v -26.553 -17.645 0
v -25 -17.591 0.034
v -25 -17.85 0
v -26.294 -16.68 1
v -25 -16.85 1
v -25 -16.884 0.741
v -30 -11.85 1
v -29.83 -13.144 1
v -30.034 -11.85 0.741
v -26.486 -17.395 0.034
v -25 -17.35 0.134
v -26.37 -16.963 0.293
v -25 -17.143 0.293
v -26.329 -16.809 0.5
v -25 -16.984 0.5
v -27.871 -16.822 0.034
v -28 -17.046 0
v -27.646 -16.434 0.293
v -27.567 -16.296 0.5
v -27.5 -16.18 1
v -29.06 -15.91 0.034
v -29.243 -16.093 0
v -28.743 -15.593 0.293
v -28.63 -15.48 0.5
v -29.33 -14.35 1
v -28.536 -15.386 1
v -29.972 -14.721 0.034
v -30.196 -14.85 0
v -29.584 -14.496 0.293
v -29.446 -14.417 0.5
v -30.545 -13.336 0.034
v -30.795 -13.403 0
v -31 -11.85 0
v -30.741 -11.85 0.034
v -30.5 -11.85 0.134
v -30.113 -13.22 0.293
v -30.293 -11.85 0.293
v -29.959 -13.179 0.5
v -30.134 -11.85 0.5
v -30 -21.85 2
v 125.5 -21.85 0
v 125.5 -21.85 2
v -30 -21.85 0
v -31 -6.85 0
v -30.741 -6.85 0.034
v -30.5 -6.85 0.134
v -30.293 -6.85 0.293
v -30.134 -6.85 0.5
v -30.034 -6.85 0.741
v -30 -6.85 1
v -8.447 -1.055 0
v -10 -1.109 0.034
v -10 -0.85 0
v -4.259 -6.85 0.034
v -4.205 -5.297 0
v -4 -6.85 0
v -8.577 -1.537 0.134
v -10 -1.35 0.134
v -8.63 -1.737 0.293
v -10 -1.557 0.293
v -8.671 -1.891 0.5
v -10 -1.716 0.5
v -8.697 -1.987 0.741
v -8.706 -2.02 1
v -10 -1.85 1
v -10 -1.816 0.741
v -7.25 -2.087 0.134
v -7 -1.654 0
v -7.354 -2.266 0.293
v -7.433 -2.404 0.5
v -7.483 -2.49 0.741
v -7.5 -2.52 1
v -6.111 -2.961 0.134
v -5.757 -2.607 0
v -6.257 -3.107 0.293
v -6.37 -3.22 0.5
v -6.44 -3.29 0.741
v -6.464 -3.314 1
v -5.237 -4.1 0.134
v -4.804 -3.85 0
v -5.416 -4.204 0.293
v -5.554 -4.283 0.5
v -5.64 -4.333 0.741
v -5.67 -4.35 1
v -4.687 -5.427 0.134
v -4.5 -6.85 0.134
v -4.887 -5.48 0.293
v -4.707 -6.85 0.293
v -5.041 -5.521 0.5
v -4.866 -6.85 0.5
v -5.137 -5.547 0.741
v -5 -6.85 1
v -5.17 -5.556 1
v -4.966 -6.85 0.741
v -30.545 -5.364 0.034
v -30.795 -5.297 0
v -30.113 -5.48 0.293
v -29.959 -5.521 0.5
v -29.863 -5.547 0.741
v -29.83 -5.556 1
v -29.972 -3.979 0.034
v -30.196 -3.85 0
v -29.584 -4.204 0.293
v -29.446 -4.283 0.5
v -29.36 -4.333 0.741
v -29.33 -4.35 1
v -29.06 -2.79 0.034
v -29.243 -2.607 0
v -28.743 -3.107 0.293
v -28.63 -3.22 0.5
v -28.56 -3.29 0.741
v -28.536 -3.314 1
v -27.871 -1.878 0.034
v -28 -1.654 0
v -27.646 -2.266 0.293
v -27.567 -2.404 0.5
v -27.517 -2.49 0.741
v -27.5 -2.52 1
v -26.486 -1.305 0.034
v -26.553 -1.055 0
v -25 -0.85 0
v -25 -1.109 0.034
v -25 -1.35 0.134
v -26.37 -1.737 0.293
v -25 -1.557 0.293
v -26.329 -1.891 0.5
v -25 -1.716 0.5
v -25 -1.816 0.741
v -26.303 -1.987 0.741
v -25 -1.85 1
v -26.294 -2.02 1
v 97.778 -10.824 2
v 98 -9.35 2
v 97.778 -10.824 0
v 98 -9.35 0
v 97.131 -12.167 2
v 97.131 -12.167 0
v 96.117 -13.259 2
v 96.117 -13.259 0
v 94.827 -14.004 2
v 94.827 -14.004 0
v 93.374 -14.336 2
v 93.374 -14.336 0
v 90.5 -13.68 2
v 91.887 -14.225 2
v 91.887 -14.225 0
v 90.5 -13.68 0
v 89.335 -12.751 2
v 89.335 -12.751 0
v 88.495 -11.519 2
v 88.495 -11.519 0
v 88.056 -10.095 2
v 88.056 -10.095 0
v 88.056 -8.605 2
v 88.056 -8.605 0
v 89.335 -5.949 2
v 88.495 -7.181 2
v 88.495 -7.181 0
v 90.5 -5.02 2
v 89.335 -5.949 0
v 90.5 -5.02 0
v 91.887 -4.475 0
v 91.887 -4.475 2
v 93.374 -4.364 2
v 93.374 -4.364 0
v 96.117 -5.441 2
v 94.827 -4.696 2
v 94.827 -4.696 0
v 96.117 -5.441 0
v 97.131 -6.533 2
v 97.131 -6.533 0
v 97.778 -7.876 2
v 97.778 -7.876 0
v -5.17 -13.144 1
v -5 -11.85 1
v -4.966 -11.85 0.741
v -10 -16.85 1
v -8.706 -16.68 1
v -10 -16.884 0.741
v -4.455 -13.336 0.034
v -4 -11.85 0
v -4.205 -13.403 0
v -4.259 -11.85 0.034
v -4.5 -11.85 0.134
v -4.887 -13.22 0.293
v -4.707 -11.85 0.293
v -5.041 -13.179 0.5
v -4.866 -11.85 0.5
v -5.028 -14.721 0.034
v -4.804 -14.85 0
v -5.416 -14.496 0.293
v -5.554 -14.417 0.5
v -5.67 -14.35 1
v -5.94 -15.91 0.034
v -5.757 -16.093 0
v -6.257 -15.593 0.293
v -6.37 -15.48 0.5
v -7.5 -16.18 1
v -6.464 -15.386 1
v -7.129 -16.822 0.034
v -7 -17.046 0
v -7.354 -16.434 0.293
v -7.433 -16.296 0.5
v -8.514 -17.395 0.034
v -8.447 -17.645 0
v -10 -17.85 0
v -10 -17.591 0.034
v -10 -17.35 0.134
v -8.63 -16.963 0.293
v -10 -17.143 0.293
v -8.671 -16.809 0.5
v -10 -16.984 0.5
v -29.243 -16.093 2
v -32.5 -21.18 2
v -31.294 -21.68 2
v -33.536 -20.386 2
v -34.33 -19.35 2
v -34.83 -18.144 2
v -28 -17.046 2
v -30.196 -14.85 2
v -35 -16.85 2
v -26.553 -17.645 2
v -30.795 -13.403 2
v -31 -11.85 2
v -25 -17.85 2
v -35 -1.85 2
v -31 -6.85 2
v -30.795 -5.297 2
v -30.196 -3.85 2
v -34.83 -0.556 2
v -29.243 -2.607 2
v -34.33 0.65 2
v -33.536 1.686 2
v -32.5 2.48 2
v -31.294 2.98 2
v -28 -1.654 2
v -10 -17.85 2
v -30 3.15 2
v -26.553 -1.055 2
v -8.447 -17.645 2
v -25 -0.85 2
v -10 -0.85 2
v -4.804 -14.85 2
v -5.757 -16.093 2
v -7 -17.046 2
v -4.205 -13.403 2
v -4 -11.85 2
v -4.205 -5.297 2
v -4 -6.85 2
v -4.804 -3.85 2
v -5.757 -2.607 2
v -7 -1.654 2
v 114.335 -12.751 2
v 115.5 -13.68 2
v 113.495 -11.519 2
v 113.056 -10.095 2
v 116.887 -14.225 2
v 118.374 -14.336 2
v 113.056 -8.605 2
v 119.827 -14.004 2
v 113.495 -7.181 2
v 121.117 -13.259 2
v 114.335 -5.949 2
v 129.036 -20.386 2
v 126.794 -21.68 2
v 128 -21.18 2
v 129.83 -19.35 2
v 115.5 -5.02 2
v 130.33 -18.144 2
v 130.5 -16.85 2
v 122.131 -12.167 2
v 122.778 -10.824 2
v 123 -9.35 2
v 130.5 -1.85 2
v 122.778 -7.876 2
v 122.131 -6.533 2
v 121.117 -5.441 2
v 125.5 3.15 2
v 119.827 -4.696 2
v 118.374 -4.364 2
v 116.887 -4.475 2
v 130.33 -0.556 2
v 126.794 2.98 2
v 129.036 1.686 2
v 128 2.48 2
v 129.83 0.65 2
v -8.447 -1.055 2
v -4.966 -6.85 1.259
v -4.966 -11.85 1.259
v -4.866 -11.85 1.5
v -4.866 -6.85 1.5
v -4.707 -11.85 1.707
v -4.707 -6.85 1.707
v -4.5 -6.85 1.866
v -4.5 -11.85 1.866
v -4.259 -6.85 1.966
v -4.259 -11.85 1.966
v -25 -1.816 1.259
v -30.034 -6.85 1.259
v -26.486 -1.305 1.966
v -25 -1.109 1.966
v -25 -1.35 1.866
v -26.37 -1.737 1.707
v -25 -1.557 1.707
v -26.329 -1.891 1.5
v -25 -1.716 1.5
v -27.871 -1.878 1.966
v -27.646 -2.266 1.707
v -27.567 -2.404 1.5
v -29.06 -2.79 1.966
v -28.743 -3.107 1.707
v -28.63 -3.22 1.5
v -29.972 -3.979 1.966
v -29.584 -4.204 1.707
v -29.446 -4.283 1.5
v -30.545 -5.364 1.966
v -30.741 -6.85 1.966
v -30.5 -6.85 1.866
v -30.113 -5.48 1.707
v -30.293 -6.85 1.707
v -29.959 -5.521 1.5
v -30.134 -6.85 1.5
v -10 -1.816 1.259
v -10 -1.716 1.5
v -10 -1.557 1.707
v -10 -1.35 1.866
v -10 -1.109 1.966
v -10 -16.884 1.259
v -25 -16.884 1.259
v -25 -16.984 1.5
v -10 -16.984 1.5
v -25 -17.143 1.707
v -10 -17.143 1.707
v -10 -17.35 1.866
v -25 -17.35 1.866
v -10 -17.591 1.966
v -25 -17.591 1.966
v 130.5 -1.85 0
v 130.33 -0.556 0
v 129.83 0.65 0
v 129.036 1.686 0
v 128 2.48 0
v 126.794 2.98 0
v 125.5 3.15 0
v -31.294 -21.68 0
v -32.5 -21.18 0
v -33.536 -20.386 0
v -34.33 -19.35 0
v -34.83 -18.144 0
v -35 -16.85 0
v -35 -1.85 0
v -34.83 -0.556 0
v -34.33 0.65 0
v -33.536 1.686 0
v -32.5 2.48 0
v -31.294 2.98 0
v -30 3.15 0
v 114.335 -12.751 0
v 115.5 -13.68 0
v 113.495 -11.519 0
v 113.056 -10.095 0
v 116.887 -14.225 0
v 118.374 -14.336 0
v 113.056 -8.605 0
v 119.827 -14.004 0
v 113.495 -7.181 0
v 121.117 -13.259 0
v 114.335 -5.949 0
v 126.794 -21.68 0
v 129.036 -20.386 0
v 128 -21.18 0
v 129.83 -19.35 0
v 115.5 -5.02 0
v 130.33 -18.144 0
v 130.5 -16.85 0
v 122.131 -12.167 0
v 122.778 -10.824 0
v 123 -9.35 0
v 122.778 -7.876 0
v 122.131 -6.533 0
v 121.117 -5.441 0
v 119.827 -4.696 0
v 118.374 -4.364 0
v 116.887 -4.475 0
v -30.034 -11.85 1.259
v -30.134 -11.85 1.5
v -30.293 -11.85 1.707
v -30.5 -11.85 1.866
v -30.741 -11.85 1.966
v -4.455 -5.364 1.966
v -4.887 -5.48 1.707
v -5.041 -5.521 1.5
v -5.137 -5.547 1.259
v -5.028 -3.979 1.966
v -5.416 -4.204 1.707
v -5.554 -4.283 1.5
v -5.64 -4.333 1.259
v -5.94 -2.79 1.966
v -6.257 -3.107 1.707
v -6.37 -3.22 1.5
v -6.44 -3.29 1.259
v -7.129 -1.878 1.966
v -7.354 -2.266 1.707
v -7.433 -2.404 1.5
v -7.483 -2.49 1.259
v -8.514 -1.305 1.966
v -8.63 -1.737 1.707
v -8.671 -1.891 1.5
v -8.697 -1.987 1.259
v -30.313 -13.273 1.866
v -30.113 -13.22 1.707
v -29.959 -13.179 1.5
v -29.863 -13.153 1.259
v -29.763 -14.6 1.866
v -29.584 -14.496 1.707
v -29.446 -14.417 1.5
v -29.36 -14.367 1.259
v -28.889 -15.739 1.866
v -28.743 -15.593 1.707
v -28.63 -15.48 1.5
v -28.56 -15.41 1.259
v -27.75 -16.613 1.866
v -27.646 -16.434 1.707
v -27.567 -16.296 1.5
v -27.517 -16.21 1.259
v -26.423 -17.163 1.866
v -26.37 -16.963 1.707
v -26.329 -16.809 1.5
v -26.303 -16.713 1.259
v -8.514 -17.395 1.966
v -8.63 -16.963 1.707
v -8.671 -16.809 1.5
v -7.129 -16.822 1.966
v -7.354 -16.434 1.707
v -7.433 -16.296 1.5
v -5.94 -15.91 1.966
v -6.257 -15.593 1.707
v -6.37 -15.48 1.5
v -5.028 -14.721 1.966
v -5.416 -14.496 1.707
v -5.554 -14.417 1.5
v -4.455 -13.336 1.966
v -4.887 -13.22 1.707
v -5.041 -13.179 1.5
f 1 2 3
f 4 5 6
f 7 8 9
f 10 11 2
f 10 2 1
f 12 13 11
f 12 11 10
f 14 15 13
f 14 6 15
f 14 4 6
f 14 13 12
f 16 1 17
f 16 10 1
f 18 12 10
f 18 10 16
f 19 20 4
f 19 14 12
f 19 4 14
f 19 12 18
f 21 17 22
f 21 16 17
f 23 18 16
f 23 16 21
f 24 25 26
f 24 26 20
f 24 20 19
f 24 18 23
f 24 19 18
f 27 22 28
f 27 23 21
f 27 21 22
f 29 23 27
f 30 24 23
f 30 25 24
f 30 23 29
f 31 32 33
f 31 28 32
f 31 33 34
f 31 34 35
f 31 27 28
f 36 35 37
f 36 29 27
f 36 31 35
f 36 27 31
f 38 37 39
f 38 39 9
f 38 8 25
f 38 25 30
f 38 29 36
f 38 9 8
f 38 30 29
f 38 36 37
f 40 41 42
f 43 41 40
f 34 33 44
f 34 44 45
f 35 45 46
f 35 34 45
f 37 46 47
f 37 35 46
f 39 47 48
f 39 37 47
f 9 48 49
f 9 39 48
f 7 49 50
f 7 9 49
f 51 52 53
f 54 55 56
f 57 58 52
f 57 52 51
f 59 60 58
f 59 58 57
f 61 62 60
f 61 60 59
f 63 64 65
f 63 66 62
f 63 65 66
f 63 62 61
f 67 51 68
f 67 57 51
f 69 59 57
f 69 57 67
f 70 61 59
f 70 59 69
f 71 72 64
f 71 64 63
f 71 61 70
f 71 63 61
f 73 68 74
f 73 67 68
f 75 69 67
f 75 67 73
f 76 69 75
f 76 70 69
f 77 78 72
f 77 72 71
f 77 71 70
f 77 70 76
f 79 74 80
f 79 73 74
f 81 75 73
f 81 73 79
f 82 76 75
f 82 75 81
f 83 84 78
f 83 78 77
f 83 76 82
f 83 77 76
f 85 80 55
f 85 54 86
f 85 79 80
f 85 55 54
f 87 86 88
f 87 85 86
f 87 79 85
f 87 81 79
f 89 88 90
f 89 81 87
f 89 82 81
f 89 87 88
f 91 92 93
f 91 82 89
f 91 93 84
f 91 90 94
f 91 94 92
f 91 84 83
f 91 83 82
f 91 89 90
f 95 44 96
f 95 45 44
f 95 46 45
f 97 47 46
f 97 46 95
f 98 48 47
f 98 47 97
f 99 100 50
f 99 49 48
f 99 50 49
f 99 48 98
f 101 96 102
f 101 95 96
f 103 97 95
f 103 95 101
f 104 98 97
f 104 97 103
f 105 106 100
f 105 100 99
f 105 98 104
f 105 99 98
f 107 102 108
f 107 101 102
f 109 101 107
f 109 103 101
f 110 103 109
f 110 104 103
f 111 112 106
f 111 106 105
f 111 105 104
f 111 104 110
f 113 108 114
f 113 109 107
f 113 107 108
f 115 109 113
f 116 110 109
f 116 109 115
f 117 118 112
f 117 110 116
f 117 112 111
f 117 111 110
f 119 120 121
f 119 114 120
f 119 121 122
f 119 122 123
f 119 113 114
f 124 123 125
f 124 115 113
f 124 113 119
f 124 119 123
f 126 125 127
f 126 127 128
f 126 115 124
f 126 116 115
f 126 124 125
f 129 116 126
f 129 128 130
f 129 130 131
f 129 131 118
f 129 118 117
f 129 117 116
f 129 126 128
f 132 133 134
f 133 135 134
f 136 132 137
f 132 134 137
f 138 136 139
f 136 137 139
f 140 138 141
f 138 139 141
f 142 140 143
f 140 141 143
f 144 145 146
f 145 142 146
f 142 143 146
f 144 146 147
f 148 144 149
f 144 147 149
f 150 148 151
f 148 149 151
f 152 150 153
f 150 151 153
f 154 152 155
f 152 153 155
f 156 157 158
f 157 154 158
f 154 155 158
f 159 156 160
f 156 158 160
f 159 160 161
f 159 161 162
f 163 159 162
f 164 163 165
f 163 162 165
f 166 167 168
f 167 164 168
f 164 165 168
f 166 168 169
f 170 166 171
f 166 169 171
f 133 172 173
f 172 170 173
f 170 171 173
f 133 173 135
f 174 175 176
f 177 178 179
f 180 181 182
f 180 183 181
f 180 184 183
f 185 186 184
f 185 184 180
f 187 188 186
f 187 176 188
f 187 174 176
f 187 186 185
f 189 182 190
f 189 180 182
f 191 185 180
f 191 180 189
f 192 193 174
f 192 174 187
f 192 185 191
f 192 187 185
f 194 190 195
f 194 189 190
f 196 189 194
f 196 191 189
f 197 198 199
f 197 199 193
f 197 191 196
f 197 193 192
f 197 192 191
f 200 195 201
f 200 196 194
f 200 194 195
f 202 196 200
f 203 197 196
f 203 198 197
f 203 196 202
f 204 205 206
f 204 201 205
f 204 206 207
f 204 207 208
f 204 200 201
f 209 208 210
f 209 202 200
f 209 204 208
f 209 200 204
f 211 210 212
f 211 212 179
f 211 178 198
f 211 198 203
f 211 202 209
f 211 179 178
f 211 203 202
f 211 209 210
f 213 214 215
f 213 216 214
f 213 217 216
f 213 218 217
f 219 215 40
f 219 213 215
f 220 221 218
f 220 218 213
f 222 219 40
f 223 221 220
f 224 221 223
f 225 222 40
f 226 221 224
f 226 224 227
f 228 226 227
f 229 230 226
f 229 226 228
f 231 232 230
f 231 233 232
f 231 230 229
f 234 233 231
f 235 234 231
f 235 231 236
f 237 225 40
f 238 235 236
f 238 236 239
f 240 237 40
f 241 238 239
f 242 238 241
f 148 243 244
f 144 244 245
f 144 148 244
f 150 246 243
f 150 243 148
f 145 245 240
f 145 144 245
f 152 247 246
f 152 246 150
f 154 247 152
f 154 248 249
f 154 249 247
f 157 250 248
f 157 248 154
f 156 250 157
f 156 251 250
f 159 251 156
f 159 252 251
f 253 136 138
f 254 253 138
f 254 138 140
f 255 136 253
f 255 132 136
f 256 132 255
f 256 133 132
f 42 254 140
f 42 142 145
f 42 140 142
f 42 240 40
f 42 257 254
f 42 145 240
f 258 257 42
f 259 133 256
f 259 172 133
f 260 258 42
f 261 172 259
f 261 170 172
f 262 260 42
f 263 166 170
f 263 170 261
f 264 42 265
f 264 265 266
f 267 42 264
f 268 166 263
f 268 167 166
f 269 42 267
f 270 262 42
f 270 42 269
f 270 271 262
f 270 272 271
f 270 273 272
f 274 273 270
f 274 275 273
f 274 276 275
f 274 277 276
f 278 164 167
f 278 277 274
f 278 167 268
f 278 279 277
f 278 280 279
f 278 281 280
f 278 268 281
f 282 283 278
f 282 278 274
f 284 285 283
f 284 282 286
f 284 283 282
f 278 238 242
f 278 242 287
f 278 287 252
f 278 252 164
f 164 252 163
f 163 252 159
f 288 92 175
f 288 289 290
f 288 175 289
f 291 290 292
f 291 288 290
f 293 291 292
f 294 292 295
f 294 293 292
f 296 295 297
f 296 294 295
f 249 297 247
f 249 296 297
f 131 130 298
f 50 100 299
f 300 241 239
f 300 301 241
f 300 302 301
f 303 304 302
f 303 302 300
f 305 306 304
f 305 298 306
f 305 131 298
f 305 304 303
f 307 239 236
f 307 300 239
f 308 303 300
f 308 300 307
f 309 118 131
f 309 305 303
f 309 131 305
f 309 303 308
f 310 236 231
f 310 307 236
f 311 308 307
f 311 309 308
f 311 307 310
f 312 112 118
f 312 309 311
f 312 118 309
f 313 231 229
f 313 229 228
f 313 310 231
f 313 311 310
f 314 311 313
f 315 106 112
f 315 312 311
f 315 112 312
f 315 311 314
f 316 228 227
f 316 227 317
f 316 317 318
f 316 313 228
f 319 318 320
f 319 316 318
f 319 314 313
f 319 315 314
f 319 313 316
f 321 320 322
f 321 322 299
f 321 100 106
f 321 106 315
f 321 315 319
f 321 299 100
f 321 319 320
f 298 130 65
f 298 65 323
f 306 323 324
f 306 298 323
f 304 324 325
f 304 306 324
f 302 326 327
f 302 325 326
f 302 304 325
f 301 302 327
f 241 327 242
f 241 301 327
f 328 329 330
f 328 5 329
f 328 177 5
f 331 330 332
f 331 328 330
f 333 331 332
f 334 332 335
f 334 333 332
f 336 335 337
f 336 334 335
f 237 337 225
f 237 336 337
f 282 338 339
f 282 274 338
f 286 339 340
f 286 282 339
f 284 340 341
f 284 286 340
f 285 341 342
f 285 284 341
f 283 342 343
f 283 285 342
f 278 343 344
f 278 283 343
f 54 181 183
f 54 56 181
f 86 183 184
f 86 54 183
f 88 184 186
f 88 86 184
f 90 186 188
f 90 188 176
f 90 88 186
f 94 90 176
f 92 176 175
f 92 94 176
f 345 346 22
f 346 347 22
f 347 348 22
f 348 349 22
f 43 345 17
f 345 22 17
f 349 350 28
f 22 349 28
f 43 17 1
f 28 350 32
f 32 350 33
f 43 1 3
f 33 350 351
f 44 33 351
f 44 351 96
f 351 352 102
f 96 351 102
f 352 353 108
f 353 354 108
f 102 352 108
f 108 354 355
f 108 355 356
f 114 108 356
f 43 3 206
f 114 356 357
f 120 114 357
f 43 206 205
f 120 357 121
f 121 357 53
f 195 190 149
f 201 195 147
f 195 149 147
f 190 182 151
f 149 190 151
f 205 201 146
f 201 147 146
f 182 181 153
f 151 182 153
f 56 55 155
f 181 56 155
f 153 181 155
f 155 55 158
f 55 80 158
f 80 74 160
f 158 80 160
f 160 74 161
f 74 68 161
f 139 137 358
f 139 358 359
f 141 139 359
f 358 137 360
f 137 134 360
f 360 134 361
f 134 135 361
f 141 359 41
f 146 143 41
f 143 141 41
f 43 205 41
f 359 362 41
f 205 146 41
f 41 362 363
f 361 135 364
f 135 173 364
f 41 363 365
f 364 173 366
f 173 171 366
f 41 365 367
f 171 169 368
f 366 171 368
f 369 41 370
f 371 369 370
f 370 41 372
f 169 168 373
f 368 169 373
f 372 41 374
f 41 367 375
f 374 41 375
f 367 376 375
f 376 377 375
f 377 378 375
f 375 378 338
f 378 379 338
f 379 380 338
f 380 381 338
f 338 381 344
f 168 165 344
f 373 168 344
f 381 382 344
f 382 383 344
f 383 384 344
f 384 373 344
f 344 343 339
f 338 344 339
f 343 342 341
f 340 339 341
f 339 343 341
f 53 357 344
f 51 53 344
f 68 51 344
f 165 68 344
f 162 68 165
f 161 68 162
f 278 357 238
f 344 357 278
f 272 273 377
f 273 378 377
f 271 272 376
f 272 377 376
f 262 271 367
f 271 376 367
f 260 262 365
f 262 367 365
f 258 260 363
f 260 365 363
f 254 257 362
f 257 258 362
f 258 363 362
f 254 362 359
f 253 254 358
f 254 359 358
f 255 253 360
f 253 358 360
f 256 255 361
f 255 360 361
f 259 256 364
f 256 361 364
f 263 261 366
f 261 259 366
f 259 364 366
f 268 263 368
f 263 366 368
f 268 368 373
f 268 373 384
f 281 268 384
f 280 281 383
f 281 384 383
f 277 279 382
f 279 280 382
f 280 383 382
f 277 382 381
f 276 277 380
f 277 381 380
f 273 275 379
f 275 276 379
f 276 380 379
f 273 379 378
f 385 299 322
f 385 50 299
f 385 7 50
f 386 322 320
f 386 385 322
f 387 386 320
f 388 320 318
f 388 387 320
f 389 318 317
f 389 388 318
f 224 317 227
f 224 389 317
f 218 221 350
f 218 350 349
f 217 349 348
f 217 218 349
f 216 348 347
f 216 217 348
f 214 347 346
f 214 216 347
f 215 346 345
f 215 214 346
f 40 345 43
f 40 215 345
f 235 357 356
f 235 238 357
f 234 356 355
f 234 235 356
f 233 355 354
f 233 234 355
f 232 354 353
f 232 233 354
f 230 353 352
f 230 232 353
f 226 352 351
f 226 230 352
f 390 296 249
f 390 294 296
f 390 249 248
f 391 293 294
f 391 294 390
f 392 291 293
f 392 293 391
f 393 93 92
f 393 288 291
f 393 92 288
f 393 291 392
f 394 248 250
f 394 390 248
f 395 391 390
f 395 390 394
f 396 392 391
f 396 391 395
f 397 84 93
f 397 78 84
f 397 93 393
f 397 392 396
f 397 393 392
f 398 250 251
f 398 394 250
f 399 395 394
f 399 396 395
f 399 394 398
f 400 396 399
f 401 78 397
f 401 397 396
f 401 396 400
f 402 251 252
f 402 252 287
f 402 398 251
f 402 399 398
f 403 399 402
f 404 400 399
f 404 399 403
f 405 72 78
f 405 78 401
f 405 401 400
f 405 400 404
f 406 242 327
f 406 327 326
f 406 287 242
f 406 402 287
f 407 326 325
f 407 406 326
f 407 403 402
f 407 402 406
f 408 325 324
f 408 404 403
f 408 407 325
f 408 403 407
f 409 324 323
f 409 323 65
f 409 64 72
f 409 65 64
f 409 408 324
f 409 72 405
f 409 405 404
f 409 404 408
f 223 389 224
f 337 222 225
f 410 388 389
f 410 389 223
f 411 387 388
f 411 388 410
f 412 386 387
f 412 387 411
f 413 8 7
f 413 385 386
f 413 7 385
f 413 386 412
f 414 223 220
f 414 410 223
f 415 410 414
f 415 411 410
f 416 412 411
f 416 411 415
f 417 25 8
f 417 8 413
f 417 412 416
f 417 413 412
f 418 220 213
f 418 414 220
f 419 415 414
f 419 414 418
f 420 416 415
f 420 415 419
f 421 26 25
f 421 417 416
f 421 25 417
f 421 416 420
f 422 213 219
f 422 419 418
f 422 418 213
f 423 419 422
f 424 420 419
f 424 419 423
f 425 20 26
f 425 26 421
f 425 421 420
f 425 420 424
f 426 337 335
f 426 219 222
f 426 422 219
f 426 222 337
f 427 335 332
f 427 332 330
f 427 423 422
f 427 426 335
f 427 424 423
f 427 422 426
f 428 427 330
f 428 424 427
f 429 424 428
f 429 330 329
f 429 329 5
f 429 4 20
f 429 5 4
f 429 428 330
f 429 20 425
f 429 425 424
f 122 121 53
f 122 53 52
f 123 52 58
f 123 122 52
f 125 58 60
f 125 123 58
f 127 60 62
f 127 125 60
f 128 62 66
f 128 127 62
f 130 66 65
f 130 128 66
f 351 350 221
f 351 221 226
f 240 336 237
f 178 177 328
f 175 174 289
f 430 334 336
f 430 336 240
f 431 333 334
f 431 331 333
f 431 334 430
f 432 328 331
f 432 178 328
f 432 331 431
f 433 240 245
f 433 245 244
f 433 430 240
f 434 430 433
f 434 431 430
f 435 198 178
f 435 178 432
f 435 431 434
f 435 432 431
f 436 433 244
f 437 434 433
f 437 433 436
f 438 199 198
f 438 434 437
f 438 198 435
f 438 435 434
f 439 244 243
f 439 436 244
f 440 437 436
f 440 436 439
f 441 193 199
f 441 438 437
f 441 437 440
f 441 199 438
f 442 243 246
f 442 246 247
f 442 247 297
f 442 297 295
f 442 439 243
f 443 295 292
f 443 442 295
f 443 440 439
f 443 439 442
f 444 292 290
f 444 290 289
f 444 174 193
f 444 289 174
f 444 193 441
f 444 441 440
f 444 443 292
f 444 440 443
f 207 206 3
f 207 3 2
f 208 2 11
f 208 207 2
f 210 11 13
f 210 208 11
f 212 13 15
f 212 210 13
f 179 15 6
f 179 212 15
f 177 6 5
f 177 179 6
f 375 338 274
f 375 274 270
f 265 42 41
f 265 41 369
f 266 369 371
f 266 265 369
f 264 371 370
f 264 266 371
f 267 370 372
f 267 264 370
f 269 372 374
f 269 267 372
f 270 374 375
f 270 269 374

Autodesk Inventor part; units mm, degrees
ref_plane "YZ Plane" through (0, 0, 0) normal (1, 0, 0) x (0, 1, 0)
ref_plane "XZ Plane" through (0, 0, 0) normal (0, 1, 0) x (-1, 0, 0)
ref_plane "XY Plane" through (0, 0, 0) normal (0, 0, 1) x (1, 0, 0)
ref_plane "Arbeitsebene1" through (0, 0, 0) normal (0, 0, 1) x (1, 0, 0)
sketch "Skizze1" plane through (0, 0, 0) normal (0, 0, 1) x (1, 0, 0)
  circle A0 centre (118, -9.35) radius 5 construction
  circle A1 centre (118, -9.35) radius 5
  circle A2 centre (93, -9.35) radius 5 construction
  circle A3 centre (93, -9.35) radius 5
  line L0 (130.5, -21.85) -> (-35, -21.85)
  line L1 (-35, -21.85) -> (-35, 3.15)
  line L2 (-35, 3.15) -> (130.5, 3.15)
  line L3 (130.5, 3.15) -> (130.5, -21.85)
  line L4 (-30, -16.85) -> (-5, -16.85)
  line L5 (-5, -16.85) -> (-5, -1.85)
  line L6 (-5, -1.85) -> (-30, -1.85)
  line L7 (-30, -1.85) -> (-30, -16.85)
  line L8 (0, -2.2) -> (0, -28) construction
  point P0 (0, 0)
  dimension "d0" = 12.5
  dimension "d1" = 25
  dimension "d2" = 12.5
  dimension "d3" = 5
  dimension "d4" = 5
  dimension "d5" = 5
  dimension "d6" = 25
  dimension "d7" = 5
  dimension "d8" = 15
extrude "Extrusion1" add sketch "Skizze1" along normal blind 2
fillet "Rundung1" radius 5 8 edges at (-5, -16.85, 1) (-30, -16.85, 1) (-30, -1.85, 1) (-5, -1.85, 1) (-35, -21.85, 1) (-35, 3.15, 1) (130.5, -21.85, 1) (130.5, 3.15, 1)
fillet "Rundung2" radius 1 16 edges at (-17.5, -1.85, 2) (-28.5355, -3.3145, 2) (-30, -9.35, 2) (-28.5355, -15.3855, 2) (-17.5, -16.85, 2) (-6.4645, -15.3855, 2) (-5, -9.35, 2) (-6.4645, -3.3145, 2) (-5, -9.35, 0) (-6.4645, -15.3855, 0) (-17.5, -16.85, 0) (-28.5355, -15.3855, 0) (-30, -9.35, 0) (-28.5355, -3.3145, 0) (-17.5, -1.85, 0) (-6.4645, -3.3145, 0)
equation "\"d1\" = 2 * d0"
equation "\"d2\" = d0"
equation "\"d4\" = d3"
equation "\"d5\" = d3"
equation "\"d7\" = d3"
properties part number "hangmount"
